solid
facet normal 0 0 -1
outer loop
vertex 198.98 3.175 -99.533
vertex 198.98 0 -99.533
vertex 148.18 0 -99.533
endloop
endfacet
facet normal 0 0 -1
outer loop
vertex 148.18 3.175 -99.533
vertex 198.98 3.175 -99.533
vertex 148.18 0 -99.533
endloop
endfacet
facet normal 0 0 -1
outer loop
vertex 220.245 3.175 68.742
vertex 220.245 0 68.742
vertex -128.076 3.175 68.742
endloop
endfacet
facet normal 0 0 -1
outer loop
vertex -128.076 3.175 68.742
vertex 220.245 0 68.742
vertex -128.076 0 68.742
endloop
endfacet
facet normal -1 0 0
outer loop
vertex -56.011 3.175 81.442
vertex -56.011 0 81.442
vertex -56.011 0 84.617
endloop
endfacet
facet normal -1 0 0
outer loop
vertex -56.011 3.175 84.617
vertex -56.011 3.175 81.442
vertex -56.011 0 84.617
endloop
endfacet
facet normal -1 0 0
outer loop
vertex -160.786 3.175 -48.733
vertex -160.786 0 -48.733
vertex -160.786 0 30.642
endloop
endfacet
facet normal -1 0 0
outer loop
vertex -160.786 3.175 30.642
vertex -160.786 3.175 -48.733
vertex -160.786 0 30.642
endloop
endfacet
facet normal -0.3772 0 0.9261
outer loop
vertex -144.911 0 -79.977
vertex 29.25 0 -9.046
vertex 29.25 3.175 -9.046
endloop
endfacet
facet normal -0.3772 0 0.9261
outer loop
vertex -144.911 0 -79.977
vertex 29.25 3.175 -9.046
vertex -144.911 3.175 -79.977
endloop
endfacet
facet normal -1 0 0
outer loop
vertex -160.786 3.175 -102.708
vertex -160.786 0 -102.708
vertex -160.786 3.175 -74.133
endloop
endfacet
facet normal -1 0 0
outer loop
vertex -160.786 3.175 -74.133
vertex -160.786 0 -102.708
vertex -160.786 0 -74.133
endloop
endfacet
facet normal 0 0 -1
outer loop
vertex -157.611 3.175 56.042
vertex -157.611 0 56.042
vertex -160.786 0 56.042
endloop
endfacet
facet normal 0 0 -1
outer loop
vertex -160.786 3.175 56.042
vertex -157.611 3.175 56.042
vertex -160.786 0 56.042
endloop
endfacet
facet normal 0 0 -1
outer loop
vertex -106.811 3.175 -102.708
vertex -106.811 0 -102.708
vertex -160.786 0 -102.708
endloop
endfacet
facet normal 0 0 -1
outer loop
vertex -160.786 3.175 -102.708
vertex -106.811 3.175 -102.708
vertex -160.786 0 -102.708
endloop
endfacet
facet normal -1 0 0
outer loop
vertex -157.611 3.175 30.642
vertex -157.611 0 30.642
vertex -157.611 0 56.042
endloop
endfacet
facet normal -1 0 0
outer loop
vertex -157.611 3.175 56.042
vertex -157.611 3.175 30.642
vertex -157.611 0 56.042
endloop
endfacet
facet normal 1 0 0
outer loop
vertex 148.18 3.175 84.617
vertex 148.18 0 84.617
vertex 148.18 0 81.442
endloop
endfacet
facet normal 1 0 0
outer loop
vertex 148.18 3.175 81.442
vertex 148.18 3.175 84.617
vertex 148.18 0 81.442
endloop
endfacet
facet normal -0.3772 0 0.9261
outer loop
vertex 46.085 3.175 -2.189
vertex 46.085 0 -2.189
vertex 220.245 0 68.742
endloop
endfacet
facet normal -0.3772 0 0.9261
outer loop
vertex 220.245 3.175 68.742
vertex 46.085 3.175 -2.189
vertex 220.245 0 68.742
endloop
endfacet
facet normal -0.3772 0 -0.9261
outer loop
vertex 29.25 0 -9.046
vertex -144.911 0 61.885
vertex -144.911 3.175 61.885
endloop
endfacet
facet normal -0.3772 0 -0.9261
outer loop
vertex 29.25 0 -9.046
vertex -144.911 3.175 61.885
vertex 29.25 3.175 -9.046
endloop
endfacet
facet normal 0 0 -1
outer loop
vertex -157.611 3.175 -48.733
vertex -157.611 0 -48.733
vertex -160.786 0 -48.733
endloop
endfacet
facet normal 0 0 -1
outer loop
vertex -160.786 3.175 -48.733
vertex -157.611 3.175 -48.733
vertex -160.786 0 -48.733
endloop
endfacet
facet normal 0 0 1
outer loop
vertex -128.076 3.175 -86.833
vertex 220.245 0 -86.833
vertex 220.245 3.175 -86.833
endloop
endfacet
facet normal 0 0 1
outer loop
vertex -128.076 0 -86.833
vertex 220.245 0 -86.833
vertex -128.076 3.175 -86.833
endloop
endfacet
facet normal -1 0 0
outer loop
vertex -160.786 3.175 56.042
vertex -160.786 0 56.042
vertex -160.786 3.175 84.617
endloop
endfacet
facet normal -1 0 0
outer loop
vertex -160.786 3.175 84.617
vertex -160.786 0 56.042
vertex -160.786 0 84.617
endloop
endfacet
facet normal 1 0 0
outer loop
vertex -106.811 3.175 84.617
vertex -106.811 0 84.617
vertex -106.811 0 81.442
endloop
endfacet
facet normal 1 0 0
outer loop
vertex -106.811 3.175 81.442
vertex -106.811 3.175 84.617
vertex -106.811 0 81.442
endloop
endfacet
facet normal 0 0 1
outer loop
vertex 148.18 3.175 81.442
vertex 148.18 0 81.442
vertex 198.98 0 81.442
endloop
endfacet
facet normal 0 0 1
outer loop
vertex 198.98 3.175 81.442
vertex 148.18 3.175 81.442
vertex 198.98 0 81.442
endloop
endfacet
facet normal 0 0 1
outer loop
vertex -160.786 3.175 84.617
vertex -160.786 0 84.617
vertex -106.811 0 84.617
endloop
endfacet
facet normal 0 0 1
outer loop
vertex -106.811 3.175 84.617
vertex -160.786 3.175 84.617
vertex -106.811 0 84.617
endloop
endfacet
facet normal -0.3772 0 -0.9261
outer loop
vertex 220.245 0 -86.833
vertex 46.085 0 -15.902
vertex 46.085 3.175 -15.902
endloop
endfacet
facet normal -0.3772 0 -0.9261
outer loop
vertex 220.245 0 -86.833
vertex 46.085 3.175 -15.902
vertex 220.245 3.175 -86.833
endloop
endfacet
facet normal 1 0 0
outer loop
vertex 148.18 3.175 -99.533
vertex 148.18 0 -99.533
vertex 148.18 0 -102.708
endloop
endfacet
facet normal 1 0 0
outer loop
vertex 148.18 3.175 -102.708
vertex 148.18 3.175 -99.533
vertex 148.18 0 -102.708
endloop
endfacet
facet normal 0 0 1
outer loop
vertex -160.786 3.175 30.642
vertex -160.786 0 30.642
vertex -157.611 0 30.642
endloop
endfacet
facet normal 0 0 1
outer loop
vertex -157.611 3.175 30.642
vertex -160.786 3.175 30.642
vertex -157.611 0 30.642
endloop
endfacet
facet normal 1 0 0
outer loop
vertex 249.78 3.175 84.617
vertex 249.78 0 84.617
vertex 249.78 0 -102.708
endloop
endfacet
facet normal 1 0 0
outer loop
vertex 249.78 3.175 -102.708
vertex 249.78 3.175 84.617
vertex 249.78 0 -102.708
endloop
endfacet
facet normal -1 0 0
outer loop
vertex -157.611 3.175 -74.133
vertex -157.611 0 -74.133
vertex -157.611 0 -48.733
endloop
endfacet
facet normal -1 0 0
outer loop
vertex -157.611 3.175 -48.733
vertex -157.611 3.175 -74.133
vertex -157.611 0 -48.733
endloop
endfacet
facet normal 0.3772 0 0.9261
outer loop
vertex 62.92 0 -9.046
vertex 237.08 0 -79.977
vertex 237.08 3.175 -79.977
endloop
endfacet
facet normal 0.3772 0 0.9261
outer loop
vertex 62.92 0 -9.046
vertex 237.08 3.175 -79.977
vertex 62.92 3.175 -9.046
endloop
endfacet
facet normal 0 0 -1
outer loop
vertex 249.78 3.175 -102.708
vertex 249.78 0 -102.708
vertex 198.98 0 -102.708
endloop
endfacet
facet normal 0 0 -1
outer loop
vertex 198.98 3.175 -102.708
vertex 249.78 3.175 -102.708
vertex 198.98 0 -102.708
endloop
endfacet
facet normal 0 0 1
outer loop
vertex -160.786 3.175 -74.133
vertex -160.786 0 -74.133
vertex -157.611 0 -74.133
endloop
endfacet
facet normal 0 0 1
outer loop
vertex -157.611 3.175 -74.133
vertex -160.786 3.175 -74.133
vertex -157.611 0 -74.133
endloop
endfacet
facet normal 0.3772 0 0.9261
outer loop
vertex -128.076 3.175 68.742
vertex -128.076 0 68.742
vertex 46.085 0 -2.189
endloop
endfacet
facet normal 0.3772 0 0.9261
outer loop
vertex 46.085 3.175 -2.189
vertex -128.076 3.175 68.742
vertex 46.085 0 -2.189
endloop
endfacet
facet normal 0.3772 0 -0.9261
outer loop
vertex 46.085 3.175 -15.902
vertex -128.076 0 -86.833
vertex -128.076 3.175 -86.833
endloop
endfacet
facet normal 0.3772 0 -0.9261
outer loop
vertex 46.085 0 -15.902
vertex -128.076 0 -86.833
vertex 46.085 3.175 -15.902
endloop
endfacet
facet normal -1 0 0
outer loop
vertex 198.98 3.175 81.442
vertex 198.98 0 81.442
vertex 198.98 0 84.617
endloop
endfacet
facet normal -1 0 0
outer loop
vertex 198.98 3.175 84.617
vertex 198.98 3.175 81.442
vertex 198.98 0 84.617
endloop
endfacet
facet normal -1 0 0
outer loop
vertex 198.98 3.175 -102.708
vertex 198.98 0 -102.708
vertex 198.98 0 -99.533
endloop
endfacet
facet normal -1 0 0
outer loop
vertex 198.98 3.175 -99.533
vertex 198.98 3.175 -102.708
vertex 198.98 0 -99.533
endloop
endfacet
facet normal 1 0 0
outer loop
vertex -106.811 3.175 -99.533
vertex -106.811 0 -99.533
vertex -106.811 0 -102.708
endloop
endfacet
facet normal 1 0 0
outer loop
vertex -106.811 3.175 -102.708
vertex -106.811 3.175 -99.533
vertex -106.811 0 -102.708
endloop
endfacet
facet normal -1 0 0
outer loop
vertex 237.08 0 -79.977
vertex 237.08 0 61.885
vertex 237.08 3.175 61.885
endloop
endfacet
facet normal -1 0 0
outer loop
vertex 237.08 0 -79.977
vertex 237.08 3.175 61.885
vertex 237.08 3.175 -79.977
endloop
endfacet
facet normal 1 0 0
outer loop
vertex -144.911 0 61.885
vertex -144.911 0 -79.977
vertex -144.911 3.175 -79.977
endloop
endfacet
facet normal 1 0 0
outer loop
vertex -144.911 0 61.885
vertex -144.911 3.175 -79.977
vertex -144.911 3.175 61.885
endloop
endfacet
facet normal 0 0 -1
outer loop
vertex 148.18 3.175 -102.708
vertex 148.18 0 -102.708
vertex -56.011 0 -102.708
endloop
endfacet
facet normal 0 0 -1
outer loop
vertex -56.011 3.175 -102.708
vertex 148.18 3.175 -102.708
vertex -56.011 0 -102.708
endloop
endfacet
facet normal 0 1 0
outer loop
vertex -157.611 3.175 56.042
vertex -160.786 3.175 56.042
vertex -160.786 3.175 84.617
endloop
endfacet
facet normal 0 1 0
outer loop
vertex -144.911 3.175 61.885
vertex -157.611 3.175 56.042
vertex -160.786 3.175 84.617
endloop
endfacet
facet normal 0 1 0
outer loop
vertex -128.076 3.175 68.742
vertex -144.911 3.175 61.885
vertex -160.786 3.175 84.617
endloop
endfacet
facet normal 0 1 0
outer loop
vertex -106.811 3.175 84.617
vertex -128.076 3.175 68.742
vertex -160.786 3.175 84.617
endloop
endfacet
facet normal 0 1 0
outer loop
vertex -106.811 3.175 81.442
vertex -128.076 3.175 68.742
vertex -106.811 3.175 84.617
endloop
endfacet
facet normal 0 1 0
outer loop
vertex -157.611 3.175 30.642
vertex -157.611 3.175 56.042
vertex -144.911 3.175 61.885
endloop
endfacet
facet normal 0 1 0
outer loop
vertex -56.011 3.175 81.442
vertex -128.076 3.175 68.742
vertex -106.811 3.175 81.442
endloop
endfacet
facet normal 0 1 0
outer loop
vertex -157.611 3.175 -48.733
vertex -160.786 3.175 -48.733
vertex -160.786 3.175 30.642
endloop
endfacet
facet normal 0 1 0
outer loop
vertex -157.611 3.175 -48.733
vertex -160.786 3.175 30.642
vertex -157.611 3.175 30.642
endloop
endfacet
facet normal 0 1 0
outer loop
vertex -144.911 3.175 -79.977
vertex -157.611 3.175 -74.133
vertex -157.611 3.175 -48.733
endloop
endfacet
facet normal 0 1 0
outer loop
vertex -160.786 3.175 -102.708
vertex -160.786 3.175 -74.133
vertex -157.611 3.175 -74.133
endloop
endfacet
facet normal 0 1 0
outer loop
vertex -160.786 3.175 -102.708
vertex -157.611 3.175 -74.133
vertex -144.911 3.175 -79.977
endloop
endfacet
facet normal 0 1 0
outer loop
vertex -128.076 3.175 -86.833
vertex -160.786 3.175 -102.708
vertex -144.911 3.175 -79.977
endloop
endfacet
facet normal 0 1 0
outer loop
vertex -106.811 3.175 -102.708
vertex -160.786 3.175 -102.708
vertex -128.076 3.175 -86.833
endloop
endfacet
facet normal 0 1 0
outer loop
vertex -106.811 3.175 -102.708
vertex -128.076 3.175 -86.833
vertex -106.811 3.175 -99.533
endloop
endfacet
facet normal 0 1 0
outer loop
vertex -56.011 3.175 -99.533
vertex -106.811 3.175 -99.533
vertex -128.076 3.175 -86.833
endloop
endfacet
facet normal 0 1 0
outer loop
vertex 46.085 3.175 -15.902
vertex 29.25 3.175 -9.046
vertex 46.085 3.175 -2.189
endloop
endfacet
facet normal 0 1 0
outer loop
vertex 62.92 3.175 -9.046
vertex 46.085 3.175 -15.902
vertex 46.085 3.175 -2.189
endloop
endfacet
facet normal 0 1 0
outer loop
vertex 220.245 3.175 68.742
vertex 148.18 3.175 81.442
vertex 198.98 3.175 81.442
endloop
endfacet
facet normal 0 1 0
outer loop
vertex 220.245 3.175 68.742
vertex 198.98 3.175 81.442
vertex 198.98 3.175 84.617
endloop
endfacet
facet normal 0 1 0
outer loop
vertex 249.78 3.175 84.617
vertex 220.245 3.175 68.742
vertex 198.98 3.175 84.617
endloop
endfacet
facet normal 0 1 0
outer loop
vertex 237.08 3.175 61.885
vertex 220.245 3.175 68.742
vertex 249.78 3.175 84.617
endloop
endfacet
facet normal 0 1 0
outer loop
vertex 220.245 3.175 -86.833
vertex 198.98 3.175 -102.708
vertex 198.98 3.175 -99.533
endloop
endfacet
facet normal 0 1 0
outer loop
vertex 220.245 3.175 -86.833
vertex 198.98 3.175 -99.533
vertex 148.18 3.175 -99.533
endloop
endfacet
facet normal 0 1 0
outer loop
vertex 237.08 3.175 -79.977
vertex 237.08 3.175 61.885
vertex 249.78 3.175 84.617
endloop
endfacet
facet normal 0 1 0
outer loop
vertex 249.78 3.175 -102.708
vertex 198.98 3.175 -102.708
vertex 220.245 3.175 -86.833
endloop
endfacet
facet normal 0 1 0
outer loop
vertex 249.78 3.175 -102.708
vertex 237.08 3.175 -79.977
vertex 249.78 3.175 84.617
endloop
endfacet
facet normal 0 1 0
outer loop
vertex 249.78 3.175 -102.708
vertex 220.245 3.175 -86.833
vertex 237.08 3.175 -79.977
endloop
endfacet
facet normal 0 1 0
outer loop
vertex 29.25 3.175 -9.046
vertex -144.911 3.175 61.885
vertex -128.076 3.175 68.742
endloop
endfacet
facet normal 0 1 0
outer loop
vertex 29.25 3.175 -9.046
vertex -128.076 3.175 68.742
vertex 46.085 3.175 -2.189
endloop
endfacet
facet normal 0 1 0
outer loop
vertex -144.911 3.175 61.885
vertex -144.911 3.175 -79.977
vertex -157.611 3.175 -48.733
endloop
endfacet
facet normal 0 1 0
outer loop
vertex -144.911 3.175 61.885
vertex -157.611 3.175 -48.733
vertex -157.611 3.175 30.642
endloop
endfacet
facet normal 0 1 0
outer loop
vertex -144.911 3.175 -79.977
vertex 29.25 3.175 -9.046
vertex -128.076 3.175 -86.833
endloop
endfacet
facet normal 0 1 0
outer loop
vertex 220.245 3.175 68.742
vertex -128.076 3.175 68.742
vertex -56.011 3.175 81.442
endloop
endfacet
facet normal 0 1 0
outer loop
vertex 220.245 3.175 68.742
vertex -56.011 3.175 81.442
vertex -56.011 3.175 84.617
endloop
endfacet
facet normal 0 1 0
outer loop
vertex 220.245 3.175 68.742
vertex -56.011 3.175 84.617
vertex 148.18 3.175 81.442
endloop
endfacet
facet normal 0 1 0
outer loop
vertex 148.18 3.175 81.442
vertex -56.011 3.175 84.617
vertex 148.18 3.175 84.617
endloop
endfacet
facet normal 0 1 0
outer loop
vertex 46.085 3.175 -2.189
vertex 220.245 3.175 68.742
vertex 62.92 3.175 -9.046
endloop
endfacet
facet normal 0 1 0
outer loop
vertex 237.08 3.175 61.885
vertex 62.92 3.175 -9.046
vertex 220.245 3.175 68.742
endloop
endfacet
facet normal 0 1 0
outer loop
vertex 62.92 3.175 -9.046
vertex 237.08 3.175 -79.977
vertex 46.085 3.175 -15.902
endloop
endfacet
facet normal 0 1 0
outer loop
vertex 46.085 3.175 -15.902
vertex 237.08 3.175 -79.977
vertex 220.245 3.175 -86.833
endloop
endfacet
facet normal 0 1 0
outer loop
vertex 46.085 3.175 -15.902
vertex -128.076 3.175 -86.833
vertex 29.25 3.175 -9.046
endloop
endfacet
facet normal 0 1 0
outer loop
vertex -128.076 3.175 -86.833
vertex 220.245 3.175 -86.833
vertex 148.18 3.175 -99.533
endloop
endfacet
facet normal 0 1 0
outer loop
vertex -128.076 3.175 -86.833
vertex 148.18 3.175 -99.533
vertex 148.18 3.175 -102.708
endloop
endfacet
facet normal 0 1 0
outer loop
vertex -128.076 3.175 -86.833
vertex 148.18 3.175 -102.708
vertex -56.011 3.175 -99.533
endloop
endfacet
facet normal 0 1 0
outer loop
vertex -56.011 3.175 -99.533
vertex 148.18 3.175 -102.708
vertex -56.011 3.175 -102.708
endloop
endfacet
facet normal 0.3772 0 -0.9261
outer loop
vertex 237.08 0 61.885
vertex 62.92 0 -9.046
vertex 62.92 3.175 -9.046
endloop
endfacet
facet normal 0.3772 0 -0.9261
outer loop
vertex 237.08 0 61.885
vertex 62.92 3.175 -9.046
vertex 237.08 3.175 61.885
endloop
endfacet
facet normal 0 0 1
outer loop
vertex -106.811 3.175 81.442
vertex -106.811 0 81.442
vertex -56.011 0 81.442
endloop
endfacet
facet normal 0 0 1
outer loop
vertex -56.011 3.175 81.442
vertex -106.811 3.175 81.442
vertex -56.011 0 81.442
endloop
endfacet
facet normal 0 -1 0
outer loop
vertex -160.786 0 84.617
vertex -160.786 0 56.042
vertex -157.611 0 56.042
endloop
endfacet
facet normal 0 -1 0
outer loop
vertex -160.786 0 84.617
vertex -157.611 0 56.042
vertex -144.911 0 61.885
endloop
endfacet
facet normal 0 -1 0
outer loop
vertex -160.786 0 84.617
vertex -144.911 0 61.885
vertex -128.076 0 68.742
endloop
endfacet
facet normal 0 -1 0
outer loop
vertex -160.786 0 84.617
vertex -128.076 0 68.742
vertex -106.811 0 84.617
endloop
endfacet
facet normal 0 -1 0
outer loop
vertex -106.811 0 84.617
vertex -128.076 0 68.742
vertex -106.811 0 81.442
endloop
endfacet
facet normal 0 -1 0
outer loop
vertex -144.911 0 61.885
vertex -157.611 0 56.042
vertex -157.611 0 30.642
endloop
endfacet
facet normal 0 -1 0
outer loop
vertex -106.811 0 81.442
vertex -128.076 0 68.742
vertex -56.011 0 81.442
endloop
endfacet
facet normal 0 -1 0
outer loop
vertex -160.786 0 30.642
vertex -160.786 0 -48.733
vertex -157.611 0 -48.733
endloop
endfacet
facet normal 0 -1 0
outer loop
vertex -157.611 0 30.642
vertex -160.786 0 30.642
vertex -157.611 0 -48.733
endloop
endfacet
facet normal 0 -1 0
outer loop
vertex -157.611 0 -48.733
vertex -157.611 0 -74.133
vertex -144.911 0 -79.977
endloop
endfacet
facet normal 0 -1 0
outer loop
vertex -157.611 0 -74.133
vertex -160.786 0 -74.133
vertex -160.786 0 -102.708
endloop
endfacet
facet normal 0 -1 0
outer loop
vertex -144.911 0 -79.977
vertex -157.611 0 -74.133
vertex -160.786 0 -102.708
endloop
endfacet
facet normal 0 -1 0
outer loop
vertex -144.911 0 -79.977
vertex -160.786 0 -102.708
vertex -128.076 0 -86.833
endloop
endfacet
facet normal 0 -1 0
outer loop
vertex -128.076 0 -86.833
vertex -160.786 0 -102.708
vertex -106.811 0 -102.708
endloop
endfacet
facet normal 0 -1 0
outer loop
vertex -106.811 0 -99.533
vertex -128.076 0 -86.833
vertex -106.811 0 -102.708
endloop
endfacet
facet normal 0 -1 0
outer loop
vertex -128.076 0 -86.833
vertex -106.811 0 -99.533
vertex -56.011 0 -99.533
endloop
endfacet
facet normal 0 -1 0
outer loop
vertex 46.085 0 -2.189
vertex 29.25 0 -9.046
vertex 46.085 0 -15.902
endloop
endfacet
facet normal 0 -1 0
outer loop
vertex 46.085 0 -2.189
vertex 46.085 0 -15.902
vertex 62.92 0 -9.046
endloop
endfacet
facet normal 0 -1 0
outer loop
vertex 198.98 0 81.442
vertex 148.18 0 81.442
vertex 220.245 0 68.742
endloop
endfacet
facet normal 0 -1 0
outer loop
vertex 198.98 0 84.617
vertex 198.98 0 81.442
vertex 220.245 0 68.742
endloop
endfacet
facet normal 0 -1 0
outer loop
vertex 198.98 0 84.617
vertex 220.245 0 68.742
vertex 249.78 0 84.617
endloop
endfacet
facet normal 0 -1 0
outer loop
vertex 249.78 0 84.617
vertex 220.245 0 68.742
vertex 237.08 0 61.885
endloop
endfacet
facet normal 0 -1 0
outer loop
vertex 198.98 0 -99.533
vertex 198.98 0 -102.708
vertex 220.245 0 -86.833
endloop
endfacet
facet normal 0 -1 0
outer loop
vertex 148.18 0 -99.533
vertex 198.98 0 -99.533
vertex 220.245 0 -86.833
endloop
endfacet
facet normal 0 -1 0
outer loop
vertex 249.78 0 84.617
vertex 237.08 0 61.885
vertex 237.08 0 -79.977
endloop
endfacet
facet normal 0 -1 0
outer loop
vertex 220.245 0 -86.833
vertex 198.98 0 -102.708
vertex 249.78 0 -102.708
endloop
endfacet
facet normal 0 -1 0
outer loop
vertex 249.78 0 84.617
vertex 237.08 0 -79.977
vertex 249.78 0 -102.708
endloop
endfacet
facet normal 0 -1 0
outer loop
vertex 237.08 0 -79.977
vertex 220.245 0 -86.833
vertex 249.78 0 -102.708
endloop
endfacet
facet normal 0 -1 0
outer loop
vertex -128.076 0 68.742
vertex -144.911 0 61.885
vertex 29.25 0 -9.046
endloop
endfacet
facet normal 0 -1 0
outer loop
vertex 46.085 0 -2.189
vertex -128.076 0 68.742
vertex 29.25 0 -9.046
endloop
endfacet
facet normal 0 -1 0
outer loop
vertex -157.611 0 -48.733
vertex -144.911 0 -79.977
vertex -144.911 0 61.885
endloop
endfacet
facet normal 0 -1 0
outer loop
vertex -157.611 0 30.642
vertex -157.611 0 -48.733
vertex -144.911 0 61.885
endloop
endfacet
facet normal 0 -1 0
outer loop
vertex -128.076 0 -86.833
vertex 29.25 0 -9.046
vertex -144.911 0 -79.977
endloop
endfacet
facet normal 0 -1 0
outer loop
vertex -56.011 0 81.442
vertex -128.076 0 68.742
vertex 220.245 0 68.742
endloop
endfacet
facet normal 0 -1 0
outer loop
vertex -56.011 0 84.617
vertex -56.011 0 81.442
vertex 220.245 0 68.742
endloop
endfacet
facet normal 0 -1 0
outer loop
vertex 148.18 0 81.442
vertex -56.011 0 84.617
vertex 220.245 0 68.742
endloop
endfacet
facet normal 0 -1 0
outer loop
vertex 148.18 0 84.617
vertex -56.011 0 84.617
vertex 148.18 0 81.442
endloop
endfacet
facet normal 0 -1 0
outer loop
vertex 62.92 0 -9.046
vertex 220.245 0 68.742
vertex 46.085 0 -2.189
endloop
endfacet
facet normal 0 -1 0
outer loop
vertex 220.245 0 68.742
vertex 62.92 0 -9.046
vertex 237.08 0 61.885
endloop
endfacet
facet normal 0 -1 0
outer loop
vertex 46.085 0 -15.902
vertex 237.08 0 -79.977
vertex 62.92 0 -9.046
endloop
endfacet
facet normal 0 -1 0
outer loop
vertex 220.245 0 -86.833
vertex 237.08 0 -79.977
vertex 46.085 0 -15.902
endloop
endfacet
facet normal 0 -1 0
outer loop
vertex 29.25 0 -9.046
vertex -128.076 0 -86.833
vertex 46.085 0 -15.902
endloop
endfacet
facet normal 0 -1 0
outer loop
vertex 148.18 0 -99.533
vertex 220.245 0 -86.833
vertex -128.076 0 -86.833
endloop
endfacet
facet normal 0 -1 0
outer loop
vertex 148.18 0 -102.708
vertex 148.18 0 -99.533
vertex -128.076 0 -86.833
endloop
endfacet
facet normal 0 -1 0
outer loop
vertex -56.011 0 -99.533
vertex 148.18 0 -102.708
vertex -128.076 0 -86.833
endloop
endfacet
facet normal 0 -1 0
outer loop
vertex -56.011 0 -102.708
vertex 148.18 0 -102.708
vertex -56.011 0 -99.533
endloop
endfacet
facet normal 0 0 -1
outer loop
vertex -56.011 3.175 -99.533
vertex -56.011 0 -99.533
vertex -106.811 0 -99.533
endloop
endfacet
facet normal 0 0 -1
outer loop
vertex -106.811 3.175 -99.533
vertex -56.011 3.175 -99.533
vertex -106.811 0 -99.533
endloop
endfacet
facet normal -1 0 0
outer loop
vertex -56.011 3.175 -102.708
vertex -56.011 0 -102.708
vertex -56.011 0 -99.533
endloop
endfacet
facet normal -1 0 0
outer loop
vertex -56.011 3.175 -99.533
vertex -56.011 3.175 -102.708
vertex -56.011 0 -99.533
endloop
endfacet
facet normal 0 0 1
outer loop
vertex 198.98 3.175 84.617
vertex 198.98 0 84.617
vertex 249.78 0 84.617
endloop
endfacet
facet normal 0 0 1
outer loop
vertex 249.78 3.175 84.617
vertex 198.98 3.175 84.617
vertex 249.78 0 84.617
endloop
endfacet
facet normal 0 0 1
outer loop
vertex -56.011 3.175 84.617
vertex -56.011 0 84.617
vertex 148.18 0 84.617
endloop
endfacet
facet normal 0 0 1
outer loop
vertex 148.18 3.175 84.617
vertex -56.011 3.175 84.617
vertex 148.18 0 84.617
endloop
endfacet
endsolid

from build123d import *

# Parameters (mm, degrees)
BOSS_EXTRUDE3_DEPTH = 3.175


with BuildPart() as part:
    # Sketch1 → Boss-Extrude3 (new body)
    with BuildSketch(Plane(origin=(0, 0, 0), x_dir=(1, 0, 0), z_dir=(0, 1, 0))):
        Polygon((-56.010613502, -81.441915492), (-56.010613502, -84.616915492), (148.179986498, -84.616915492), (148.179986498, -81.441915492), (198.979986498, -81.441915492), (198.979986498, -84.616915492), (249.779986498, -84.616915492), (249.779986498, -81.441915492), (249.779986498, 99.533084508), (249.779986498, 102.708084508), (198.979986498, 102.708084508), (198.979986498, 99.533084508), (148.179986498, 99.533084508), (148.179986498, 102.708084508), (-56.010613502, 102.708084508), (-56.010613502, 99.533084508), (-106.810613502, 99.533084508), (-106.810613502, 102.708084508), (-157.610613502, 102.708084508), (-160.785613502, 102.708084508), (-160.785613502, 99.533084508), (-160.785613502, 74.133084508), (-157.610613502, 74.133084508), (-157.610613502, 48.733084508), (-160.785613502, 48.733084508), (-160.785613502, -30.641915492), (-157.610613502, -30.641915492), (-157.610613502, -56.041915492), (-160.785613502, -56.041915492), (-160.785613502, -81.441915492), (-160.785613502, -84.616915492), (-157.610613502, -84.616915492), (-106.810613502, -84.616915492), (-106.810613502, -81.441915492), align=None)
        Polygon((46.084686498, 15.902033442), (220.245025597, 86.833084508), (-128.0756526, 86.833084508), align=None, mode=Mode.SUBTRACT)
        Polygon((-144.910613502, -61.885466558), (29.249725597, 9.045584508), (-144.910613502, 79.976635573), align=None, mode=Mode.SUBTRACT)
        Polygon((-128.0756526, -68.741915492), (46.084686498, 2.189135573), (220.245025597, -68.741915492), align=None, mode=Mode.SUBTRACT)
        Polygon((62.9196474, 9.045584508), (237.079986498, -61.885466558), (237.079986498, 79.976635573), align=None, mode=Mode.SUBTRACT)
    extrude(amount=BOSS_EXTRUDE3_DEPTH)


solid = part.part
